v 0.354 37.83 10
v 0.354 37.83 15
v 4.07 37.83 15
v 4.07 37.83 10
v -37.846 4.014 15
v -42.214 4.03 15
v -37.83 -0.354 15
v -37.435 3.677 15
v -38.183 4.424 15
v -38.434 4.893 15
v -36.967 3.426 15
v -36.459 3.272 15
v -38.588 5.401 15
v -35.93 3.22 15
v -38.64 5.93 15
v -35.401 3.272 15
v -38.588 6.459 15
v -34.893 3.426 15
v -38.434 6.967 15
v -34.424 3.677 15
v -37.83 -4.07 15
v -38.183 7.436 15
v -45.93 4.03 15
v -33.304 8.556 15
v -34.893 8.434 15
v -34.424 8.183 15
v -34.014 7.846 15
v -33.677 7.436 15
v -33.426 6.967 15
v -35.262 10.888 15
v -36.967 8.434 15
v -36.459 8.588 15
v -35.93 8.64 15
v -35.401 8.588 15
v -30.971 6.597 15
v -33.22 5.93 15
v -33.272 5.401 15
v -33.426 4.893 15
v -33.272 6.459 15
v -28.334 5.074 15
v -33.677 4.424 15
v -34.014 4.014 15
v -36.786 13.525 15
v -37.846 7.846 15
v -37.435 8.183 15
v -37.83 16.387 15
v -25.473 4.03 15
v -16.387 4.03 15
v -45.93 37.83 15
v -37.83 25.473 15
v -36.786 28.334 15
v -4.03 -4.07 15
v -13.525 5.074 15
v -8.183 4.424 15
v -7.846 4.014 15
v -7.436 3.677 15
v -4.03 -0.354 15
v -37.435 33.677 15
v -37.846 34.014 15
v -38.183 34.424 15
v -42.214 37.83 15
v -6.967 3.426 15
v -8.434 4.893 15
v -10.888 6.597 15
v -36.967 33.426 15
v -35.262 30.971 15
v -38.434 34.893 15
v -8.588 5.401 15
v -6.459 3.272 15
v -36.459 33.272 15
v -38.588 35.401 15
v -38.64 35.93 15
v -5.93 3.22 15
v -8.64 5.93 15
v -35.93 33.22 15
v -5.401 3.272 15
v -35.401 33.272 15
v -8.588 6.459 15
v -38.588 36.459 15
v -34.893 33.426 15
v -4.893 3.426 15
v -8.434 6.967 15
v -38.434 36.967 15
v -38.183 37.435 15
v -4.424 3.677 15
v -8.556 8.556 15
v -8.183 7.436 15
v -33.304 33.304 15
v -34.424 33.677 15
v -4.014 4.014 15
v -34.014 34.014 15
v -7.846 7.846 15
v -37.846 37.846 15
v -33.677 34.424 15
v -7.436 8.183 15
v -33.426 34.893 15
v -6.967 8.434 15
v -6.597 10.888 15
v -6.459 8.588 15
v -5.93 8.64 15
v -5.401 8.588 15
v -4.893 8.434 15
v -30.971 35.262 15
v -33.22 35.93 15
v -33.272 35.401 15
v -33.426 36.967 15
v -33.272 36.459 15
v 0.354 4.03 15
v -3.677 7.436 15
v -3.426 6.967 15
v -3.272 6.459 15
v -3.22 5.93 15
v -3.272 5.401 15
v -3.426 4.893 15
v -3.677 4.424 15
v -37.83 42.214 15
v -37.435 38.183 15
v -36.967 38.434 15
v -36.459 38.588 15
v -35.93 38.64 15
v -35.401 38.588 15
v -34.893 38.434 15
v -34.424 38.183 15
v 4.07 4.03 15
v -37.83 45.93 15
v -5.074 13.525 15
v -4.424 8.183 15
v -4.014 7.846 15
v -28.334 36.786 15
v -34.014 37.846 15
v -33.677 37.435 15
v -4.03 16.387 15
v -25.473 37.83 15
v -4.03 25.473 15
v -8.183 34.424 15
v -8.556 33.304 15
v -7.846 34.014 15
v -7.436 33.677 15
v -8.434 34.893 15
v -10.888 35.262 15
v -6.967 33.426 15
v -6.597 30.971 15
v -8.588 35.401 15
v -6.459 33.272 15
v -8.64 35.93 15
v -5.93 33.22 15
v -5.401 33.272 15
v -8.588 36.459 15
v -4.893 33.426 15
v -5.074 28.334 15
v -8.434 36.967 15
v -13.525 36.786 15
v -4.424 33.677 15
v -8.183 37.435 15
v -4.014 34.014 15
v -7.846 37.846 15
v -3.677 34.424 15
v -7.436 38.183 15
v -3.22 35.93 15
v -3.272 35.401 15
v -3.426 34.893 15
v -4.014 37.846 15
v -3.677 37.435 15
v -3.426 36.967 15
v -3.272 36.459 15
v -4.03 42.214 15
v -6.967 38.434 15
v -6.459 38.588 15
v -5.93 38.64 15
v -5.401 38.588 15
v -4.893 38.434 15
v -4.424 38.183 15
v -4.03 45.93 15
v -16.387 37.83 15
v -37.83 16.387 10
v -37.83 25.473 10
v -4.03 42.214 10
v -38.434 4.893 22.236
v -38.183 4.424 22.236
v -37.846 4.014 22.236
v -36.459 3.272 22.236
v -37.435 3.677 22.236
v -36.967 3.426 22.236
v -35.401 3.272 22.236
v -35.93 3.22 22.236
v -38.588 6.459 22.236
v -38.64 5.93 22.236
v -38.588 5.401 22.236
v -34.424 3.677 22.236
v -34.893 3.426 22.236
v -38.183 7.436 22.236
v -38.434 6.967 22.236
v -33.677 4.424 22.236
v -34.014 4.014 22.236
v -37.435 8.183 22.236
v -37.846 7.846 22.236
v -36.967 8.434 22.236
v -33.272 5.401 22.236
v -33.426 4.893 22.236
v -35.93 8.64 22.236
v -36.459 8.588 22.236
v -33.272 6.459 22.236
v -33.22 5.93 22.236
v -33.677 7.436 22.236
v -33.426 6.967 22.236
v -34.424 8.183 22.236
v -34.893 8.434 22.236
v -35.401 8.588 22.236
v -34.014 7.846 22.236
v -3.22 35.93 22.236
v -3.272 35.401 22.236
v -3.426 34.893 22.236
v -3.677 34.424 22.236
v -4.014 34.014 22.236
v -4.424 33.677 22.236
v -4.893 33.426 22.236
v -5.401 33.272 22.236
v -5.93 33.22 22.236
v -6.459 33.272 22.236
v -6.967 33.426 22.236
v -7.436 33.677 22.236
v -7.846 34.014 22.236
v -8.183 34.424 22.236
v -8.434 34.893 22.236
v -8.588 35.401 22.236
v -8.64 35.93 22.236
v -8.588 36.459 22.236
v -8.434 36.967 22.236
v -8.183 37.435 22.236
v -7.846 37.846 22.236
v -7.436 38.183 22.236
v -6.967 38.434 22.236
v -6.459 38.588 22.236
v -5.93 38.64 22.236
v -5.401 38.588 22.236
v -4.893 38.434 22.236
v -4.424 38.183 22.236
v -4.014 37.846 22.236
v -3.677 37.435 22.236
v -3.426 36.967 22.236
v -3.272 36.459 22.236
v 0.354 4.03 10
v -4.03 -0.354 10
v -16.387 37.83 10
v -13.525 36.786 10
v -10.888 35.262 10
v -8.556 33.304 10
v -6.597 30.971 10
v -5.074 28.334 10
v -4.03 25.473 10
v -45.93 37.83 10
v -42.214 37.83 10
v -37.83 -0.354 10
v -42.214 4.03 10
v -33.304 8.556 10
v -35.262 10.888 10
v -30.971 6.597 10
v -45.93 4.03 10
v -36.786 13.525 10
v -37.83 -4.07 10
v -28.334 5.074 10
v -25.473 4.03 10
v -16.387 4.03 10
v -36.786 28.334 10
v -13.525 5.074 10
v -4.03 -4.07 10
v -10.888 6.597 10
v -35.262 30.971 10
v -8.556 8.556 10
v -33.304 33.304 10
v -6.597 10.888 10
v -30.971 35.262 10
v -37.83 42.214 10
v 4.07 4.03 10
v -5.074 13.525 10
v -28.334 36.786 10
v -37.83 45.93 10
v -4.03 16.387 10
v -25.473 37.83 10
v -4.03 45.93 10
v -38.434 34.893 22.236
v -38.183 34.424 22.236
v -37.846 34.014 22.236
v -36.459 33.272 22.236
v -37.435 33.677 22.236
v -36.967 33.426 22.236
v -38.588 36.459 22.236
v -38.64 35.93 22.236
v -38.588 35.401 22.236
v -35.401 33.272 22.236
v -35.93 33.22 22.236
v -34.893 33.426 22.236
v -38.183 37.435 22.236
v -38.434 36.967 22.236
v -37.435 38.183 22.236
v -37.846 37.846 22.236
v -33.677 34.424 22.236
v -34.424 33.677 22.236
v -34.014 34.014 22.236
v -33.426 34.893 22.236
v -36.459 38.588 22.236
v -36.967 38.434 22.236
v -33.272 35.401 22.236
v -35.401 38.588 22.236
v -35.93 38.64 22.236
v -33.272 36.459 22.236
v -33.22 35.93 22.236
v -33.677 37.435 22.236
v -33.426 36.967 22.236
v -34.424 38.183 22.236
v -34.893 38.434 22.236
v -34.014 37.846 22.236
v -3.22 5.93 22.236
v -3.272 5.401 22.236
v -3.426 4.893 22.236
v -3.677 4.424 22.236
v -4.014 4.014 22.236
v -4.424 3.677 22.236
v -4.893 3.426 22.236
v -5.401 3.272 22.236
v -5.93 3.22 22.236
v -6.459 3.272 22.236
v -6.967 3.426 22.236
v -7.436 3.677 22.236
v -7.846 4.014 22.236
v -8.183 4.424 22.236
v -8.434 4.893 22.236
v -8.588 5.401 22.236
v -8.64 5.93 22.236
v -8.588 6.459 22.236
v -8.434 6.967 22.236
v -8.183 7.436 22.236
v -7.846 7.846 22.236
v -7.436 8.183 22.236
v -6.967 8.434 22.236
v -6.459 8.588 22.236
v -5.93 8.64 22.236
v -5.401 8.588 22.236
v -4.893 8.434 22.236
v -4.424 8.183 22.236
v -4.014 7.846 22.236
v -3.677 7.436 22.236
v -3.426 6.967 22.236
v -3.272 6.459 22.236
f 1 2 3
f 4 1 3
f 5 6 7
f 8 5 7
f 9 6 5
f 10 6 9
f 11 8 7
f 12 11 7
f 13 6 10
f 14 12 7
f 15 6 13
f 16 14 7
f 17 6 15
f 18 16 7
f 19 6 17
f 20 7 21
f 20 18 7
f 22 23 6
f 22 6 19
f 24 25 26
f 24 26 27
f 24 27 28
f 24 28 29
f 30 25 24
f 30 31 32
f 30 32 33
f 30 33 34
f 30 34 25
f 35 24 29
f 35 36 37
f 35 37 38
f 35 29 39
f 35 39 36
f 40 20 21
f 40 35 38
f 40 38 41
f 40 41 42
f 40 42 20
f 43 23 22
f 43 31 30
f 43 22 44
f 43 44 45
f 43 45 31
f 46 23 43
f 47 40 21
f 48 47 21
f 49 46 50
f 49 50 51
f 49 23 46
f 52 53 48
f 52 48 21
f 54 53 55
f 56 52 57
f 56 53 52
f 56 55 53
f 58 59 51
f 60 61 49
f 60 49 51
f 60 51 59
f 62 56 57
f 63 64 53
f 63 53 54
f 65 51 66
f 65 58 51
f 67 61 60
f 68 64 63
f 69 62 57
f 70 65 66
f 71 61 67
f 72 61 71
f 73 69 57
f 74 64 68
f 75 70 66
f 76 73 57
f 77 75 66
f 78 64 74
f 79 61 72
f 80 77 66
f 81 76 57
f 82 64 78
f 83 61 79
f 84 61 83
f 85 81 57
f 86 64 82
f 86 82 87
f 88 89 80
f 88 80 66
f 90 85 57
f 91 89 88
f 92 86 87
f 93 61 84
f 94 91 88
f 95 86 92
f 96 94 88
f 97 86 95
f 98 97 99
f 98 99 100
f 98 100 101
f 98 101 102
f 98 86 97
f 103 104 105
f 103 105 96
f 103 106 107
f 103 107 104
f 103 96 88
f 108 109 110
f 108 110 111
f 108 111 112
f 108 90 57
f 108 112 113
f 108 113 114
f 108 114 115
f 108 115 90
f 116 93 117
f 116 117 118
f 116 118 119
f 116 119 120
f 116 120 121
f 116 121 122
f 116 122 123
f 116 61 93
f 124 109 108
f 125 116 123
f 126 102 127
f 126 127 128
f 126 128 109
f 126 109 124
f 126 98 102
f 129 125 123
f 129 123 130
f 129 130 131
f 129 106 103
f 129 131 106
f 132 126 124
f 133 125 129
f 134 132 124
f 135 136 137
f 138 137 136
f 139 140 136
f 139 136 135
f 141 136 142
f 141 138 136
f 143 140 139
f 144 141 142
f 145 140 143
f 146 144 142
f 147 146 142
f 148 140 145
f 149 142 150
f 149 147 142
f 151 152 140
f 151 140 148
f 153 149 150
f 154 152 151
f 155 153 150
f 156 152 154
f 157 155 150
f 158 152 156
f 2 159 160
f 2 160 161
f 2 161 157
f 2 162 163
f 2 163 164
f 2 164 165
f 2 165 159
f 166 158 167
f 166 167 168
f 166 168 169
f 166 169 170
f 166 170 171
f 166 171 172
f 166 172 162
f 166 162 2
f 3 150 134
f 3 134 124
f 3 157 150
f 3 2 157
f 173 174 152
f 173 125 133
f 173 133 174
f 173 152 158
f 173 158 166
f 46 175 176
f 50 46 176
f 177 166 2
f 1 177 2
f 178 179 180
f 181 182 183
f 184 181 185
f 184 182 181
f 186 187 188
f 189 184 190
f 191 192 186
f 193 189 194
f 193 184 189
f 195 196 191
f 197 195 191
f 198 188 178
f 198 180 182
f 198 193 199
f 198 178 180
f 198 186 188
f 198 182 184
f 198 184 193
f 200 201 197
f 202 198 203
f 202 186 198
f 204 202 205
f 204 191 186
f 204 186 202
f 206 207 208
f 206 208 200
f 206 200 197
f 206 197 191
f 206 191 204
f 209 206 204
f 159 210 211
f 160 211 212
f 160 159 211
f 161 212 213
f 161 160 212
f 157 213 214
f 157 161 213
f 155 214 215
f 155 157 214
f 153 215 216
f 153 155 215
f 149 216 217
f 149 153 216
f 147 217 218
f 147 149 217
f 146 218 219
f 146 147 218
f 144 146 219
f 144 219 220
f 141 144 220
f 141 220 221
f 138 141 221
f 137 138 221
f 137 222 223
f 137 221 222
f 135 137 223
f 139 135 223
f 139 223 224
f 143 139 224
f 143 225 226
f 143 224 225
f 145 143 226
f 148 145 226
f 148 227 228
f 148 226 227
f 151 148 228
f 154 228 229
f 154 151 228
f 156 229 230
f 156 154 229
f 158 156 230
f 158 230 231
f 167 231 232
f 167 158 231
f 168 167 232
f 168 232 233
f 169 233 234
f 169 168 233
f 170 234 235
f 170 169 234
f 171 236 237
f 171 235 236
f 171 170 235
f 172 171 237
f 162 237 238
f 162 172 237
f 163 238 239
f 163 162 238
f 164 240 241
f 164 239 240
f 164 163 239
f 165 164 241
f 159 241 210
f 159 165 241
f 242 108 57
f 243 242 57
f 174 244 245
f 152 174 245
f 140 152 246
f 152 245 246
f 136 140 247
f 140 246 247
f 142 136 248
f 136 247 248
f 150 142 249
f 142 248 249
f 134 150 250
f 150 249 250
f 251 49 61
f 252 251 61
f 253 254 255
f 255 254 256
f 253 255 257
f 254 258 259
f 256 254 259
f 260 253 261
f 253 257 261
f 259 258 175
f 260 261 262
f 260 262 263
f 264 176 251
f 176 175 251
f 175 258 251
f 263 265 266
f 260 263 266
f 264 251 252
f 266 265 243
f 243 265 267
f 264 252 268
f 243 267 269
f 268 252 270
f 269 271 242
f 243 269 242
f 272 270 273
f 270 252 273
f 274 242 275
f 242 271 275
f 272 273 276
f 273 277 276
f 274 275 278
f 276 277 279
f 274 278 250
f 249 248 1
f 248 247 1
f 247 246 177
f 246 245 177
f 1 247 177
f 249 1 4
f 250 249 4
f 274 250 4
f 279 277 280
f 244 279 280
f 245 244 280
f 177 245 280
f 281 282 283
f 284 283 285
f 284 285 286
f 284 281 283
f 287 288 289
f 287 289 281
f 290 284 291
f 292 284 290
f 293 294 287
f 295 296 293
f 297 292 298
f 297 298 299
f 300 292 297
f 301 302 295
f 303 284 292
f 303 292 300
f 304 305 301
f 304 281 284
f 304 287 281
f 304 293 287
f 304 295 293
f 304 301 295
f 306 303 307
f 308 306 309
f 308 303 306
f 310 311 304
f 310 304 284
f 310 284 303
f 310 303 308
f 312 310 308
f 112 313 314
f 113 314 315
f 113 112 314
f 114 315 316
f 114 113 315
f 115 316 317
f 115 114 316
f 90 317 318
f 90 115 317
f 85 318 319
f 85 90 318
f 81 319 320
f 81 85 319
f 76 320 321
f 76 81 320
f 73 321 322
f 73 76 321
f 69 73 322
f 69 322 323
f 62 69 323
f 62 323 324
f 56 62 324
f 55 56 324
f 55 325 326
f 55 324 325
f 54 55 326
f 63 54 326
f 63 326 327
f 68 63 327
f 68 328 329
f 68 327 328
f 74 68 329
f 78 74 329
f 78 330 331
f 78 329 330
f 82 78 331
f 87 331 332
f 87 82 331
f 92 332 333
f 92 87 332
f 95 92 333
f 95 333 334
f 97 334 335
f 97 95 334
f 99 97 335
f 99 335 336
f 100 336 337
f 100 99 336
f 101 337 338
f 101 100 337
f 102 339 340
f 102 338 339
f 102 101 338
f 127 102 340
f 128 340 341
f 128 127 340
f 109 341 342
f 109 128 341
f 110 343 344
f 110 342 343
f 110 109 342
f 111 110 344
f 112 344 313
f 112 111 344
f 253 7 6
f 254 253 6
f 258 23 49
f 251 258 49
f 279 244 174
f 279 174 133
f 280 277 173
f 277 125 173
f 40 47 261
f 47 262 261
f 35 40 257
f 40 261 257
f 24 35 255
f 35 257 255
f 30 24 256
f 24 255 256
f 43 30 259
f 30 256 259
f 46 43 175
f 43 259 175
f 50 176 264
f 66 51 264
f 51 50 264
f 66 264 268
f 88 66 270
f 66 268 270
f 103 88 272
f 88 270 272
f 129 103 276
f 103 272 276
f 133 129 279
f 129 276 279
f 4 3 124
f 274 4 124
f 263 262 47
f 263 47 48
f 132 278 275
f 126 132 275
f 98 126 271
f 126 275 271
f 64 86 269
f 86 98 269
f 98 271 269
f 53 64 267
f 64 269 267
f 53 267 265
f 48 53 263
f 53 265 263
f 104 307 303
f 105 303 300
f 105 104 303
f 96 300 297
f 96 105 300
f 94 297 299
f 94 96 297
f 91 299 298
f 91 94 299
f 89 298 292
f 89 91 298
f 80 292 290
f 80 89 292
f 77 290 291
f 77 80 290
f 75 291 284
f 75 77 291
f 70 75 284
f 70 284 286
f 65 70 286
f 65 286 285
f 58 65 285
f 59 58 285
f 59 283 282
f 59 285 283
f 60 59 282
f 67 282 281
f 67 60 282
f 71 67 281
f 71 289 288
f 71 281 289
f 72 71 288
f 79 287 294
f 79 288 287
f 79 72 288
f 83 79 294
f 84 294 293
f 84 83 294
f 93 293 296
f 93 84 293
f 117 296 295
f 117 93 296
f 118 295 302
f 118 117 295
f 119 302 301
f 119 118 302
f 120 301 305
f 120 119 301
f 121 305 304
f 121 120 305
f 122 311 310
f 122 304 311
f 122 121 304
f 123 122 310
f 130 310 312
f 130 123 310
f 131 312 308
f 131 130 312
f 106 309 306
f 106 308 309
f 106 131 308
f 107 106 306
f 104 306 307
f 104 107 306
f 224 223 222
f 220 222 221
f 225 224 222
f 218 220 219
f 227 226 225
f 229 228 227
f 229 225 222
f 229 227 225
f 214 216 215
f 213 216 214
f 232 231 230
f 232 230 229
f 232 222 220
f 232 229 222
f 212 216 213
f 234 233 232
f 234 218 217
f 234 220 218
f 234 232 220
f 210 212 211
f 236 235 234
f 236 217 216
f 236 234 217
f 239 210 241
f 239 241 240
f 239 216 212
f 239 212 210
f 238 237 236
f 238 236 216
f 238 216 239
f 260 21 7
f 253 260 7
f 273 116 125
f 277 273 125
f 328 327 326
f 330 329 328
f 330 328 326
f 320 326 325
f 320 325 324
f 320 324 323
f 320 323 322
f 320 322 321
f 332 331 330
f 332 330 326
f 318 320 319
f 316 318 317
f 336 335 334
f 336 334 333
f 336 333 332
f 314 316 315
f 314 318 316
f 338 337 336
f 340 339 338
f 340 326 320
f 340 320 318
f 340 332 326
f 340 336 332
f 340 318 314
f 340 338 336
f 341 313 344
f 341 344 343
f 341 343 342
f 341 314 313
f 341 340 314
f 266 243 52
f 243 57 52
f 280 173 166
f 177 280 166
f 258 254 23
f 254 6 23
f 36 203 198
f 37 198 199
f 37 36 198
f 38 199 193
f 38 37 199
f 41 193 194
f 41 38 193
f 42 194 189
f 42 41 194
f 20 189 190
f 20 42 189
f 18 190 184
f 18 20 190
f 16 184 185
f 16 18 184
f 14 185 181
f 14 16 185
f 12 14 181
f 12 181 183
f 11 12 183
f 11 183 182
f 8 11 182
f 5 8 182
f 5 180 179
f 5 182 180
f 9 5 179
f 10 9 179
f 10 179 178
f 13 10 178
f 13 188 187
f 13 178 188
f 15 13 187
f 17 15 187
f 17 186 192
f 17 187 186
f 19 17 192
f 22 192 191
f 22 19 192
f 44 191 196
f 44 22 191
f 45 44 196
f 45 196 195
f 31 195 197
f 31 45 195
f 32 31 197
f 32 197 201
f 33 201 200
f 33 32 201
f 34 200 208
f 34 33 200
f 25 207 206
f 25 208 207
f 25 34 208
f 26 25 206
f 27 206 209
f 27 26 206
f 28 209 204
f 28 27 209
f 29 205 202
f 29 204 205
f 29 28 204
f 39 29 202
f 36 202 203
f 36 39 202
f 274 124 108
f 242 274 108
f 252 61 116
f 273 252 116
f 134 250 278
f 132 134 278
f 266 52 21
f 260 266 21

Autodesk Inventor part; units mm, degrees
ref_plane "YZ Plane" through (0, 0, 0) normal (1, 0, 0) x (0, 1, 0)
ref_plane "XZ Plane" through (0, 0, 0) normal (0, 1, 0) x (-1, 0, 0)
ref_plane "Work Plane1" through (0, 0, 10) normal (0, 0, 1) x (1, 0, 0)
sketch "Sketch1" plane through (0, 0, 10) normal (0, 0, 1) x (1, 0, 0)
  line L0 (-4.0299, -0.3538) -> (-2.2322, 1.4439) construction
  arc A0 (-1.4439, 2.2322) -> (-2.2322, 1.4439) centre (-0.9299, 0.9299) ccw construction
  line L1 (-1.4439, 2.2322) -> (0.3538, 4.0299) construction
  line L2 (-37.8299, 42.8299) -> (-37.8299, 37.8299) construction
  line L3 (-37.8299, 37.8299) -> (-42.9208, 37.8299) construction
  line L4 (-37.8299, 42.2137) -> (-37.8299, 45.8299) construction
  line L5 (-37.8299, 45.8299) -> (-4.0299, 45.8299) construction
  line L6 (-4.0299, 45.8299) -> (-4.0299, 42.2137) construction
  line L7 (-4.0299, 4.0299) -> (0.3538, 4.0299) projected
  circle A1 centre (-20.9299, 20.9299) radius 17.5 projected
  line L8 (-20.9299, 58.9723) -> (17.1124, 20.9299) construction
  line L9 (17.1124, 20.9299) -> (-20.9299, -17.1124) construction
  line L10 (-20.9299, -17.1124) -> (-58.9723, 20.9299) construction
  line L11 (-58.9723, 20.9299) -> (-20.9299, 58.9723) construction
  line L12 (-20.9299, 58.9723) -> (-20.9299, -17.1124) construction
  line L13 (17.1124, 20.9299) -> (-58.9723, 20.9299) construction
  line L14 (-20.9299, 58.9723) -> (32.8701, 58.9723) construction
  line L15 (-43.4299, 43.4299) -> (1.5701, 43.4299) construction
  line L16 (1.5701, 43.4299) -> (1.5701, -1.5701) construction
  line L17 (1.5701, -1.5701) -> (-43.4299, -1.5701) construction
  line L18 (-43.4299, -1.5701) -> (-43.4299, 43.4299) construction
  line L19 (-43.4299, 43.4299) -> (1.5701, -1.5701) construction
  line L20 (1.5701, 43.4299) -> (-43.4299, -1.5701) construction
  line L21 (-43.4299, 5.3876) -> (-43.4299, 36.4723)
  line L22 (-43.4299, 36.4723) -> (-36.4723, 43.4299)
  line L23 (-36.4723, 43.4299) -> (-5.3876, 43.4299)
  line L24 (-5.3876, 43.4299) -> (1.5701, 36.4723)
  line L25 (1.5701, 36.4723) -> (1.5701, 5.3876)
  line L26 (1.5701, 5.3876) -> (-5.3876, -1.5701)
  line L27 (-5.3876, -1.5701) -> (-36.4723, -1.5701)
  line L28 (-36.4723, -1.5701) -> (-43.4299, 5.3876)
  line L29 (-4.0299, 42.2137) -> (-37.8299, 42.2137) projected
  line L30 (-4.0299, -0.3538) -> (-4.0299, 4.0299) projected
  point P0 (-37.8299, 4.0299)
  point P1 (-20.9299, 20.9299)
  dimension "d18" = 53.8
  dimension "d19" = 45
  dimension "d20" = 53.8
  dimension "d21" = 45
  dimension "d22" = 45
extrude "Extrusion1" add sketch "Sketch1" along normal blind 5
sketch "Sketch2" plane through (0, 0, 15) normal (0, 0, 1) x (1, 0, 0)
  circle A0 centre (-35.9299, 35.9299) radius 3.0099 construction
  circle A1 centre (-5.93, 35.9299) radius 3.0099 construction
  circle A2 centre (-5.93, 5.93) radius 3.0099 construction
  circle A3 centre (-35.9299, 5.93) radius 3.0099 construction
  circle A4 centre (-35.9299, 35.9299) radius 2.7099
  circle A5 centre (-5.93, 35.9299) radius 2.7099
  circle A6 centre (-5.93, 5.93) radius 2.7099
  circle A7 centre (-35.9299, 5.93) radius 2.7099
  point P0 (0, 0)
  dimension "d_1" = 0.3
  dimension "d13" = 0.3
  dimension "d14" = 0.3
  dimension "d15" = 0.3
ref_plane "Work Plane2" through (-40.9959, 0.8639, 22.2359) normal (0, 0, 1) x (1, 0, 0)
extrude "Extrusion2" add sketch "Sketch2" along normal up to surface (7.2359 mm away)
sketch "Sketch3" plane through (0, 0, 10) normal (0, 0, -1) x (-1, 0, 0)
  line L0 (37.8299, -0.4701) -> (37.8299, 4.0299) construction
  line L1 (4.0299, 4.0299) -> (4.0299, -0.4701) construction
  line L2 (37.8299, -0.4701) -> (37.8299, 1.1886) construction
  line L3 (4.0299, -3.9701) -> (4.0299, -0.3538) construction
  line L4 (45.8299, 4.0299) -> (42.2137, 4.0299) construction
  line L5 (-0.3538, 4.0299) -> (-3.9701, 4.0299) construction
  line L6 (-3.9701, 37.8299) -> (-0.3538, 37.8299) construction
  line L7 (4.0299, 42.2137) -> (4.0299, 45.8299) construction
  line L8 (37.8299, 45.8299) -> (37.8299, 42.2137) construction
  line L9 (42.2137, 37.8299) -> (45.8299, 37.8299) construction
  line L10 (37.8299, 37.7299) -> (45.8299, 37.7299)
  line L11 (45.8299, 37.7299) -> (45.8299, 4.1299)
  line L12 (45.8299, 4.1299) -> (37.8299, 4.1299)
  line L13 (37.8299, 4.1299) -> (37.8299, 37.7299)
  line L14 (37.7299, 4.0299) -> (4.1299, 4.0299)
  line L15 (4.1299, 4.0299) -> (4.1299, -3.9701)
  line L16 (4.1299, -3.9701) -> (37.7299, -3.9701)
  line L17 (37.7299, -3.9701) -> (37.7299, 4.0299)
  line L18 (4.0299, 4.1299) -> (-3.9701, 4.1299)
  line L19 (-3.9701, 4.1299) -> (-3.9701, 37.7299)
  line L20 (-3.9701, 37.7299) -> (4.0299, 37.7299)
  line L21 (4.0299, 37.7299) -> (4.0299, 4.1299)
  line L22 (4.1299, 37.8299) -> (37.7299, 37.8299)
  line L23 (37.7299, 37.8299) -> (37.7299, 45.8299)
  line L24 (37.7299, 45.8299) -> (4.1299, 45.8299)
  line L25 (4.1299, 45.8299) -> (4.1299, 37.8299)
  point P0 (0, 0)
  dimension "d23" = 0.1
  dimension "d24" = 0.1
  dimension "d25" = 0.1
  dimension "d26" = 0.1
  dimension "d27" = 0.1
extrude "Extrusion3" add sketch "Sketch3" against normal up to surface (5 mm away)
sketch "Sketch4" plane through (0, 0, 15) normal (0, 0, 1) x (1, 0, 0)
  arc A0 (-16.3868, 4.0299) -> (-4.0299, 16.3868) centre (-20.9299, 20.9299) ccw projected
  line L0 (-25.4731, 4.0299) -> (-16.3868, 4.0299) projected
  arc A1 (-37.8299, 16.3868) -> (-25.4731, 4.0299) centre (-20.9299, 20.9299) ccw projected
  line L1 (-37.8299, 25.4731) -> (-37.8299, 16.3868) projected
  arc A2 (-25.4731, 37.8299) -> (-37.8299, 25.4731) centre (-20.9299, 20.9299) ccw projected
  line L2 (-16.3868, 37.8299) -> (-25.4731, 37.8299) projected
  arc A3 (-4.0299, 25.4731) -> (-16.3868, 37.8299) centre (-20.9299, 20.9299) ccw projected
  line L3 (-4.0299, 16.3868) -> (-4.0299, 25.4731) projected
  circle A4 centre (-5.93, 5.93) radius 2.7099 projected
  circle A5 centre (-5.93, 35.9299) radius 2.7099 projected
  circle A6 centre (-35.9299, 35.9299) radius 2.7099 projected
  circle A7 centre (-35.9299, 5.93) radius 2.7099 projected
  line L4 (3.9701, 4.1299) -> (0.3124, 4.1299) projected
  line L5 (3.9701, 37.7299) -> (3.9701, 4.1299) projected
  line L6 (0.3124, 37.7299) -> (3.9701, 37.7299) projected
  line L7 (0.3124, 37.7299) -> (-4.1299, 42.1723) projected
  line L8 (-4.1299, 45.8299) -> (-4.1299, 42.1723) projected
  line L9 (-37.7299, 45.8299) -> (-4.1299, 45.8299) projected
  line L10 (-37.7299, 42.1723) -> (-37.7299, 45.8299) projected
  line L11 (-37.7299, 42.1723) -> (-42.1723, 37.7299) projected
  line L12 (-45.8299, 37.7299) -> (-42.1723, 37.7299) projected
  line L13 (-45.8299, 4.1299) -> (-45.8299, 37.7299) projected
  line L14 (-42.1723, 4.1299) -> (-45.8299, 4.1299) projected
  line L15 (-42.1723, 4.1299) -> (-37.7299, -0.3124) projected
  line L16 (-37.7299, -3.9701) -> (-37.7299, -0.3124) projected
  line L17 (-4.1299, -3.9701) -> (-37.7299, -3.9701) projected
  line L18 (-4.1299, -0.3124) -> (-4.1299, -3.9701) projected
  line L19 (-4.1299, -0.3124) -> (0.3124, 4.1299) projected
  line L20 (-4.0299, 45.9299) -> (-4.0299, 42.2137)
  line L21 (-4.0299, 42.2137) -> (0.3538, 37.8299)
  line L22 (0.3538, 37.8299) -> (4.0701, 37.8299)
  line L23 (4.0701, 37.8299) -> (4.0701, 4.0299)
  line L24 (4.0701, 4.0299) -> (0.3538, 4.0299)
  line L25 (0.3538, 4.0299) -> (-4.0299, -0.3538)
  line L26 (-4.0299, -0.3538) -> (-4.0299, -4.0701)
  line L27 (-4.0299, -4.0701) -> (-37.8299, -4.0701)
  line L28 (-37.8299, -4.0701) -> (-37.8299, -0.3538)
  line L29 (-37.8299, -0.3538) -> (-42.2137, 4.0299)
  line L30 (-42.2137, 4.0299) -> (-45.9299, 4.0299)
  line L31 (-45.9299, 4.0299) -> (-45.9299, 37.8299)
  line L32 (-45.9299, 37.8299) -> (-42.2137, 37.8299)
  line L33 (-42.2137, 37.8299) -> (-37.8299, 42.2137)
  line L34 (-37.8299, 42.2137) -> (-37.8299, 45.9299)
  line L35 (-37.8299, 45.9299) -> (-4.0299, 45.9299)
  point P0 (0, 0)
  dimension "d18" = 53.8
  dimension "d19" = 45
  dimension "d20" = 53.8
  dimension "d21" = 45
  dimension "d22" = 45
  dimension "d30" = 0.1
extrude "Extrusion4" add sketch "Sketch4" against normal up to surface (5 mm away) contours L20 L21 L22 L23 L24 L25 L26 L27 L28 L29 L30 L31 L32 L33 L34 L35
equation "\"d13\" = d_1"
equation "\"d14\" = d_1"
equation "\"d15\" = d_1"
properties part number "50_Cube_Insert_Thorlabs"
